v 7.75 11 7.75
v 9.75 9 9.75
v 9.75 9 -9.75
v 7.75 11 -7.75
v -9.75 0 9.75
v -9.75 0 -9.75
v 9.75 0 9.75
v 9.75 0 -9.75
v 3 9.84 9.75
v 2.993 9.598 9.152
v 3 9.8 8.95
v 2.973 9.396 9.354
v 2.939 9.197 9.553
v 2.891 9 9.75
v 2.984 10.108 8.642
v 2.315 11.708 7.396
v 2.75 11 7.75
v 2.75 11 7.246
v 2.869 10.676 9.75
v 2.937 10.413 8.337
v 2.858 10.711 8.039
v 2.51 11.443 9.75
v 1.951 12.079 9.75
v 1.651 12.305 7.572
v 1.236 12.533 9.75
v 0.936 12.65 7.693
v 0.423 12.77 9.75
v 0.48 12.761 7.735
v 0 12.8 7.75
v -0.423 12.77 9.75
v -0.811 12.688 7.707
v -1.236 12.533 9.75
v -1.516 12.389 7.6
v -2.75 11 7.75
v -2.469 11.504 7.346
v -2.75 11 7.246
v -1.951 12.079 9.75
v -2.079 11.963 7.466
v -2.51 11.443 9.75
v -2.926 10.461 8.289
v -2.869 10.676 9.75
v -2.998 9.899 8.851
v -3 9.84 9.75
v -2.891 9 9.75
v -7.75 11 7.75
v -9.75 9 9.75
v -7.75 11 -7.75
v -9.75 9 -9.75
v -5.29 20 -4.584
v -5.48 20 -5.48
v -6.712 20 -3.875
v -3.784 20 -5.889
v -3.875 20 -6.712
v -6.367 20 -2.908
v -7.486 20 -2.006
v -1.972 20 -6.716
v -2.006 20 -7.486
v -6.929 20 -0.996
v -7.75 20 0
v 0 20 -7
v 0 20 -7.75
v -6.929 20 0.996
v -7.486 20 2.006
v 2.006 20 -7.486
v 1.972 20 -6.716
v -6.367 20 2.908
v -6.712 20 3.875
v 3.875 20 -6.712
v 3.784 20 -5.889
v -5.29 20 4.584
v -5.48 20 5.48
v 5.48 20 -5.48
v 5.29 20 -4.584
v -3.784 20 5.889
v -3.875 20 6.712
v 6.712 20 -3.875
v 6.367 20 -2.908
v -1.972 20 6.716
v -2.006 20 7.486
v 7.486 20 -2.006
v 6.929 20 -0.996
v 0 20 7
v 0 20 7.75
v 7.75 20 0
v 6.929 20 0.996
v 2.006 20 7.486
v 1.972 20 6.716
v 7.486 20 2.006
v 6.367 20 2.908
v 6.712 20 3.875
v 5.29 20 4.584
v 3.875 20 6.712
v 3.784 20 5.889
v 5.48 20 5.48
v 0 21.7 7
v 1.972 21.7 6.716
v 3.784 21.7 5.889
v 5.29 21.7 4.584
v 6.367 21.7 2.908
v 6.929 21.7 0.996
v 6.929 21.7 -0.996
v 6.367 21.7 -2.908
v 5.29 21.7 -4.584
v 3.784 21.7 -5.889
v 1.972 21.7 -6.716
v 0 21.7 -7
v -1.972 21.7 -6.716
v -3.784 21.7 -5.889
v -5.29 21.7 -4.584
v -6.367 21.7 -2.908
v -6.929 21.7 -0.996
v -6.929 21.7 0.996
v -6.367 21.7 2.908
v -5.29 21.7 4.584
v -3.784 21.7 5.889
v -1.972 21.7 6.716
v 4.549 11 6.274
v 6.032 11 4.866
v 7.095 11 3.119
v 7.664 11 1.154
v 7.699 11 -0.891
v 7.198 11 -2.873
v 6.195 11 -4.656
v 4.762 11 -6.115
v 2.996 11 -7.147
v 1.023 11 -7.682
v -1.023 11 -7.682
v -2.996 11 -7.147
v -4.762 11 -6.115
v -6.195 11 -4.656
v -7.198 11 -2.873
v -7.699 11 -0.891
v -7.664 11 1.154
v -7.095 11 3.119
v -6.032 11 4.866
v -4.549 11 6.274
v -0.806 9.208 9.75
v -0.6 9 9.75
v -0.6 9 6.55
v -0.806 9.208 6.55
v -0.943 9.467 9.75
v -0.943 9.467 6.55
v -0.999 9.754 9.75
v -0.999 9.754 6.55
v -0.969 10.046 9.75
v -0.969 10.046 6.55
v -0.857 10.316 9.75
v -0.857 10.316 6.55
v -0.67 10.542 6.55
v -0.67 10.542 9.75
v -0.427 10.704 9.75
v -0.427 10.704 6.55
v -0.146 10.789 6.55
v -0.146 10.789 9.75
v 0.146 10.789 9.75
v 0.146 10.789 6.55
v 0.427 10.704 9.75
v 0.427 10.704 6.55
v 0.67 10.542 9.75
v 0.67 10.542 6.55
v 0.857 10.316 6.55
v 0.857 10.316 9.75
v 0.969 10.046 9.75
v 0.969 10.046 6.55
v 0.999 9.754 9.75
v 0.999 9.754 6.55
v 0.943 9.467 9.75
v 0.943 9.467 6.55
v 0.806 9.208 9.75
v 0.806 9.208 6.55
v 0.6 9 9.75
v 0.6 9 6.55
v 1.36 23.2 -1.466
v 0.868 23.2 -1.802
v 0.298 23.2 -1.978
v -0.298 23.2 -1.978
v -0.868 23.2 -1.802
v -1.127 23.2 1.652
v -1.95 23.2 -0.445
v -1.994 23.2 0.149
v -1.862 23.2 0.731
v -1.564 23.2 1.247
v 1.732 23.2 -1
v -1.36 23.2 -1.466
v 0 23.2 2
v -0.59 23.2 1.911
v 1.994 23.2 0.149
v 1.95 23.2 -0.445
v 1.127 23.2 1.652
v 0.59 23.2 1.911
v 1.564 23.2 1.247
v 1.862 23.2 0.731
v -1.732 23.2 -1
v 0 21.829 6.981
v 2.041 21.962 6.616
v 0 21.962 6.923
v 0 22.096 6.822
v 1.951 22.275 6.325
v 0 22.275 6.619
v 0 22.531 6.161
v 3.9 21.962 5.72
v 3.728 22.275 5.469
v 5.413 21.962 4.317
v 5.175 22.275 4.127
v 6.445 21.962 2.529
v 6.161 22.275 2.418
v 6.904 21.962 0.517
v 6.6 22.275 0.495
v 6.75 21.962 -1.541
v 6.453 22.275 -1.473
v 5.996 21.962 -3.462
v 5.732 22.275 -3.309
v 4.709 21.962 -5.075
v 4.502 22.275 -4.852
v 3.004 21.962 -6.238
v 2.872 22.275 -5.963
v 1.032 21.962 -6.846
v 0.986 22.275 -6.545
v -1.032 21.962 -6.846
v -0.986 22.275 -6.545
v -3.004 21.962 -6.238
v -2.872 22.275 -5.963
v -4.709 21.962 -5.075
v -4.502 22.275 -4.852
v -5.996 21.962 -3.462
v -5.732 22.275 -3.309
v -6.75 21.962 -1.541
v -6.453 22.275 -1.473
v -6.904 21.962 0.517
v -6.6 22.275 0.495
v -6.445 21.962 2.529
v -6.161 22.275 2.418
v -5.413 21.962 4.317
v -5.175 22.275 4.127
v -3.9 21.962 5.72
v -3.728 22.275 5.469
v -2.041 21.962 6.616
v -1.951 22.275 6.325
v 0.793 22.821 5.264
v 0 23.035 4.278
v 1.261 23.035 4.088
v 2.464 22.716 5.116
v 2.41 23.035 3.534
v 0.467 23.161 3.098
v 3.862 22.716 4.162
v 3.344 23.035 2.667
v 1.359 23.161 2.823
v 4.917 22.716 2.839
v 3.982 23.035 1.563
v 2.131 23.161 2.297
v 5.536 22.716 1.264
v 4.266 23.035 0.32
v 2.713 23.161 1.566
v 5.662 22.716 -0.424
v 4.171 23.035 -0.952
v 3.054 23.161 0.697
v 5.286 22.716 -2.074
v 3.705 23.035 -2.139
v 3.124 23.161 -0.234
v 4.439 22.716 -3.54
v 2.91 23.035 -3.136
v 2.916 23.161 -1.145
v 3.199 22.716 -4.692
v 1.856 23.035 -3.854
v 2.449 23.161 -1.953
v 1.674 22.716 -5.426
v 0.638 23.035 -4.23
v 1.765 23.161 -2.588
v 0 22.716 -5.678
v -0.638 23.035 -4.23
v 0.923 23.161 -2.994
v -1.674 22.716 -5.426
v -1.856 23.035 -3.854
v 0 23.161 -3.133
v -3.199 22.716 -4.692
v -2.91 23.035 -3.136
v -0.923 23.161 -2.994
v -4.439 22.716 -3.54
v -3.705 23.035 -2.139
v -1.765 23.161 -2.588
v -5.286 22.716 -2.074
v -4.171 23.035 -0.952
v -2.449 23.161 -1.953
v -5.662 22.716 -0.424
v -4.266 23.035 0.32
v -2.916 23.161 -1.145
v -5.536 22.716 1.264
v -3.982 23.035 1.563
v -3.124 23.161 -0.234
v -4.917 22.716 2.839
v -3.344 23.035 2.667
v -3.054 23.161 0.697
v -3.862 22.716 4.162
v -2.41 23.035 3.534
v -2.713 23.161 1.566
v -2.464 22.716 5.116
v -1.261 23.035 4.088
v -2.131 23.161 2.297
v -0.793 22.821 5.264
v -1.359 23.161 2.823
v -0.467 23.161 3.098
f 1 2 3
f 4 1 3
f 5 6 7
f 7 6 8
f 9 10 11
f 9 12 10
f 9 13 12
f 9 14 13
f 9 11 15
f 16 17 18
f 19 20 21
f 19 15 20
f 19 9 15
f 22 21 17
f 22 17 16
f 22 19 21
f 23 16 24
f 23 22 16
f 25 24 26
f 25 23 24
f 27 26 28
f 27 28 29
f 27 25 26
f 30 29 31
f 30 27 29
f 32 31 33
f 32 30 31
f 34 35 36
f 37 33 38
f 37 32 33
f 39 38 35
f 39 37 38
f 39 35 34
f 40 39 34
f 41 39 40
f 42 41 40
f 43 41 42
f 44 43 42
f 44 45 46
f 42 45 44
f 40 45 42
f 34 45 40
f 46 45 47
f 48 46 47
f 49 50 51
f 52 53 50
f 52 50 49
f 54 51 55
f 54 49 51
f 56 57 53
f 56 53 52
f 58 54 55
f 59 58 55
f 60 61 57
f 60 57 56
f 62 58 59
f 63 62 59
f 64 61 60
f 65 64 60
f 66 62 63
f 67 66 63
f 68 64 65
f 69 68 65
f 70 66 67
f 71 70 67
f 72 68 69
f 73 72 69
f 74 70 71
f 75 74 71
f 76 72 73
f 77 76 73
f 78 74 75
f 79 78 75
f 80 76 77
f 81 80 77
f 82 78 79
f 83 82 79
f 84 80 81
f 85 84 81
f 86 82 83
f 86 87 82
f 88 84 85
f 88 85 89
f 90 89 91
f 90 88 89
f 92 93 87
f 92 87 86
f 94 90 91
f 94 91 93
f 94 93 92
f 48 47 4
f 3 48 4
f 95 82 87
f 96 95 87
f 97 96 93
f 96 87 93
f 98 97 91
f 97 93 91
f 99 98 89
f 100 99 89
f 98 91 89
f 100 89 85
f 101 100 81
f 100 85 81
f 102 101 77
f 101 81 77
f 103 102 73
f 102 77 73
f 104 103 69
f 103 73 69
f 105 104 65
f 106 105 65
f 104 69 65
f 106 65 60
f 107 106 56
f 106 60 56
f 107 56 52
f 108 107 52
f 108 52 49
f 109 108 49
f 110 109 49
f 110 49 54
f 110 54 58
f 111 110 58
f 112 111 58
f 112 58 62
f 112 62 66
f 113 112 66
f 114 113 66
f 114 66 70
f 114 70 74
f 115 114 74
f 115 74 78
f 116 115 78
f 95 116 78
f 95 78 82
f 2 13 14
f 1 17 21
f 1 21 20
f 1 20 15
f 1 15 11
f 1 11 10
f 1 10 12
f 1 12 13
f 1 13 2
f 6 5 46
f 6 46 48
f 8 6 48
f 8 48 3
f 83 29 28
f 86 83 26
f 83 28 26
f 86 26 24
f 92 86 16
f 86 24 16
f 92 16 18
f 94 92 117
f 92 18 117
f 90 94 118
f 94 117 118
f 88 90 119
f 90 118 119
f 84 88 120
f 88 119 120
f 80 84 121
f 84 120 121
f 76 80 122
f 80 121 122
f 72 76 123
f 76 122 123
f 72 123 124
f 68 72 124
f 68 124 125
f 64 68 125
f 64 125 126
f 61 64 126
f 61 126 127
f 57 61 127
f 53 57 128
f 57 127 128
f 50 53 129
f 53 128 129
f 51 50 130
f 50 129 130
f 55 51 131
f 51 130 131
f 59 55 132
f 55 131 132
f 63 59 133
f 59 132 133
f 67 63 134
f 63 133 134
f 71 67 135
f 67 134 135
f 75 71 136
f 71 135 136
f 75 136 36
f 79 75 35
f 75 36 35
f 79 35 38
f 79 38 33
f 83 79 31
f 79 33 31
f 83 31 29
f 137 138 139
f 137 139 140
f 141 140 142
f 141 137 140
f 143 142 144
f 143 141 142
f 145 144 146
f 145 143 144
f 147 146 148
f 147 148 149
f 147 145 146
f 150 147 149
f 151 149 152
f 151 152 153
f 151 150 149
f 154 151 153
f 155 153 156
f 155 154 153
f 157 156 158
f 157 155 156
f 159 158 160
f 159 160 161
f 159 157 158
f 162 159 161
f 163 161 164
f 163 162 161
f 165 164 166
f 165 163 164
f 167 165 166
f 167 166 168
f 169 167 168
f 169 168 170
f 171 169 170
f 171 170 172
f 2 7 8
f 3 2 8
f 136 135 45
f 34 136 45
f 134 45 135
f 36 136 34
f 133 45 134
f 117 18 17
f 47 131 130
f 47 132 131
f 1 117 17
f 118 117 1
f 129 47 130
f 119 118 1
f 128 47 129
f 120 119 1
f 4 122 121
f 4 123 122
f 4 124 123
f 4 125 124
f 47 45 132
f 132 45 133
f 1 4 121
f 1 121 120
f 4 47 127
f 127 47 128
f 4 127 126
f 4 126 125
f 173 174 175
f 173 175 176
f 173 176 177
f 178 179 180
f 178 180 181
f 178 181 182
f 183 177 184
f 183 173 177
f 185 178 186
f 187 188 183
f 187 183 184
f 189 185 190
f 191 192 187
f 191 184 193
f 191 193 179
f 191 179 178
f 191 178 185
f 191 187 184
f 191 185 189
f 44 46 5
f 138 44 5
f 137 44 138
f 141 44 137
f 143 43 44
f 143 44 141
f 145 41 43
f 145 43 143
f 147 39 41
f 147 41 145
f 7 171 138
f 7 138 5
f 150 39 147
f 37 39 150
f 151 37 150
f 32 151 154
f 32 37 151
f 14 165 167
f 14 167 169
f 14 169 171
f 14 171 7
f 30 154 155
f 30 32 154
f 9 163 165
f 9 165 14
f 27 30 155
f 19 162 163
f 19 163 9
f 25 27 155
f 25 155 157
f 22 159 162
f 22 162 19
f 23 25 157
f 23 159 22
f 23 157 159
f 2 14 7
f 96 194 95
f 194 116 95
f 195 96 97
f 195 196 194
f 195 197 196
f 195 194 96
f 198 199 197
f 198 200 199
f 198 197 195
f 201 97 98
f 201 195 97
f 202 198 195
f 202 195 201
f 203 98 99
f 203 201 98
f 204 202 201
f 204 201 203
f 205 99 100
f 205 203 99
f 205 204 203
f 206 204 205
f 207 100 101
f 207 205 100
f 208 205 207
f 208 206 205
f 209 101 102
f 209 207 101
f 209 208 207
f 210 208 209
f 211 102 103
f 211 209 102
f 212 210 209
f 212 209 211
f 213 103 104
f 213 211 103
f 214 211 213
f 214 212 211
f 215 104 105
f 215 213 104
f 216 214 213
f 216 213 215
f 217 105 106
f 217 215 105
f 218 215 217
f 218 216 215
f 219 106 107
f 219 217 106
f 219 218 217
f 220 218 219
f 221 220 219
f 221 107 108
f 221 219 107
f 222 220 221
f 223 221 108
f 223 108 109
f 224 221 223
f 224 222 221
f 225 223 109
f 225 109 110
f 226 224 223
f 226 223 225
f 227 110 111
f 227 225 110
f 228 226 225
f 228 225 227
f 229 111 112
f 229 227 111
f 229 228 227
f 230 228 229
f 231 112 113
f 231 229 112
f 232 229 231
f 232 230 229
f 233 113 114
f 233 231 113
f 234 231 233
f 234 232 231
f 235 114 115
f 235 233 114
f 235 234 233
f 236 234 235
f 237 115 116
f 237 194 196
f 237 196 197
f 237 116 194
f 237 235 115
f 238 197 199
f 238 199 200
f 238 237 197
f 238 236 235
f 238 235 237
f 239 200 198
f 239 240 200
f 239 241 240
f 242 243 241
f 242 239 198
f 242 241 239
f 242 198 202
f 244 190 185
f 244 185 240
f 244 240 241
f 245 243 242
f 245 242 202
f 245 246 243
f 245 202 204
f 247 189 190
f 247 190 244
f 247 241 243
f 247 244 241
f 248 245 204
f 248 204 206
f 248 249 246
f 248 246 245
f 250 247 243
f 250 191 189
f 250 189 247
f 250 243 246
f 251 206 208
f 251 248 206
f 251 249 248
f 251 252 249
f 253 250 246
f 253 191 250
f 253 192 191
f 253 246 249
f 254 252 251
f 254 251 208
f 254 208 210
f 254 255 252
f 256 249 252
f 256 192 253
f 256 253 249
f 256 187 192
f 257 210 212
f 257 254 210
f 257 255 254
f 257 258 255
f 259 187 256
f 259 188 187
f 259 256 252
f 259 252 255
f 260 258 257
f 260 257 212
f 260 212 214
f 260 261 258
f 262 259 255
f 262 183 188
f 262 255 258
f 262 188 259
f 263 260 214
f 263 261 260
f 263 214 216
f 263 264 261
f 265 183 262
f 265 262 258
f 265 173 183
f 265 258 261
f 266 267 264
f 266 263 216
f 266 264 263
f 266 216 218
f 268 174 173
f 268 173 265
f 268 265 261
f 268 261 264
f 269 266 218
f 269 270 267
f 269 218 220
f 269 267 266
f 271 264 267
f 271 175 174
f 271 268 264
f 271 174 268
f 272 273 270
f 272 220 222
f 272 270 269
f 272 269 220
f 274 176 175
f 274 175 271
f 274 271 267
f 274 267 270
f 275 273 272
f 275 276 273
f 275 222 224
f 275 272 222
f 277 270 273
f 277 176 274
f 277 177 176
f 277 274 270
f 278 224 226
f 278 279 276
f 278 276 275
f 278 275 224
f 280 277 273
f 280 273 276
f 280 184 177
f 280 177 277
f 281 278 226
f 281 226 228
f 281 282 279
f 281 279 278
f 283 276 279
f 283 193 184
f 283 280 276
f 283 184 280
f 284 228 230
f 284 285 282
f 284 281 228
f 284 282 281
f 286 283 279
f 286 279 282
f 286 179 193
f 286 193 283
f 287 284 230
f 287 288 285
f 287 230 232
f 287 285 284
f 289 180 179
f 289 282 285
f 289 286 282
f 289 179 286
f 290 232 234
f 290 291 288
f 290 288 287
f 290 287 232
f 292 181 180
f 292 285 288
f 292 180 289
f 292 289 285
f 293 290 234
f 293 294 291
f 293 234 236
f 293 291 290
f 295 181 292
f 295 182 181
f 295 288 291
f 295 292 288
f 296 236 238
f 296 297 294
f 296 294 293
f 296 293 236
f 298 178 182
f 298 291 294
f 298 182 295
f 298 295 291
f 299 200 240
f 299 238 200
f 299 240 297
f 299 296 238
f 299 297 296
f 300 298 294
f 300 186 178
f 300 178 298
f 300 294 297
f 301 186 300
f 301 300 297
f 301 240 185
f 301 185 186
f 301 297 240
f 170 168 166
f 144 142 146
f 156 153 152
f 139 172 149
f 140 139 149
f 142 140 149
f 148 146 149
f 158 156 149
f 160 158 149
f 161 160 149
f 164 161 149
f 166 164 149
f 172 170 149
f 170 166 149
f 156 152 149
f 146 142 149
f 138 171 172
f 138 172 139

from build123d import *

# Parameters (mm, degrees)
SKETCH1_W           = 19.5
SKETCH1_H           = 19.5
BOSS_EXTRUDE1_DEPTH = 11
SKETCH2_R           = 7.75
BOSS_EXTRUDE2_DEPTH = 9
SKETCH3_R           = 7
BOSS_EXTRUDE3_DEPTH = 3.2
FILLET1_SIZE        = 1.5
FILLET1_SIZE_2      = 5
CHAMFER1_SIZE       = 2
BOSS_EXTRUDE8_REACH = 33.836
SKETCH4_R           = 3
SKETCH4_R_2         = 1
CUT_EXTRUDE1_DEPTH  = 3.2


# Some blends are built 0.0001 mm under size
with BuildPart() as part:
    # Sketch1 → Boss-Extrude1 (new body)
    with BuildSketch(Plane(origin=(0, 0, 0), x_dir=(1, 0, 0), z_dir=(0, 1, 0))):
        Rectangle(SKETCH1_W, SKETCH1_H)
    extrude(amount=BOSS_EXTRUDE1_DEPTH)

    # Sketch2 → Boss-Extrude2 (add)
    with BuildSketch(Plane(origin=(0, 11, 0), x_dir=(1, 0, 0), z_dir=(0, 1, 0))):
        with Locations(Location((0, 0, 0), (0, 0, 270))):
            Circle(SKETCH2_R)
    extrude(amount=BOSS_EXTRUDE2_DEPTH)

    # Sketch3 → Boss-Extrude3 (add)
    with BuildSketch(Plane(origin=(0, 20, 0), x_dir=(1, 0, 0), z_dir=(0, 1, 0))):
        with Locations(Location((0, 0, 0), (0, 0, 270))):
            Circle(SKETCH3_R)
    extrude(amount=BOSS_EXTRUDE3_DEPTH)

    # Fillet1
    # an asymmetric fillet: 5, 1.5 mm, written as the material it takes off along each edge
    with BuildSketch(Plane(origin=(0, 23.2, 0), x_dir=(0, 0, 1), z_dir=(-1, 0, 0))) as fillet1_piece_1:
        with BuildLine():
            Bezier((7, -FILLET1_SIZE), (7, 0), (7 - FILLET1_SIZE_2, 0), weights=[1, 0.707106781, 1])
            Line((7 - FILLET1_SIZE_2, 0), (7, 0))
            Line((7, 0), (7, -FILLET1_SIZE))
        make_face()
    revolve(axis=Axis((0, 23.2, 0), (0, 1, 0)), mode=Mode.SUBTRACT)

    # Chamfer1
    chamfer1_edges = [part.edges().sort_by_distance(p)[0] for p in [
        (-9.75, 11, 0),
        (0, 11, 9.75),
        (9.75, 11, 0),
        (0, 11, -9.75),
    ]]
    chamfer(chamfer1_edges, length=CHAMFER1_SIZE - 0.0001)  # a hair under: the kernel refuses the full size

    # Sketch4 → Boss-Extrude8 (add, up to next)
    with BuildSketch(Plane.XY.offset(9.75), mode=Mode.PRIVATE) as boss_extrude8_sk1:
        with Locations((0, 9.8)):
            Circle(SKETCH4_R)
        with Locations((0, 9.8)):
            Circle(SKETCH4_R_2, mode=Mode.SUBTRACT)
    boss_extrude8_tool1 = extrude(boss_extrude8_sk1.sketch, amount=-BOSS_EXTRUDE8_REACH, mode=Mode.PRIVATE) - part.part
    add(boss_extrude8_tool1.solids().sort_by_distance((-2.915147, 9.8, 9.75))[0])

    # Sketch5 → Cut-Extrude1 (cut)
    with BuildSketch(Plane.XY.offset(9.75)):
        with BuildLine():
            Line((0.6, 9), (-0.6, 9))
            ThreePointArc((-0.6, 9), (0, 10.8), (0.6, 9))
        make_face()
    extrude(amount=-CUT_EXTRUDE1_DEPTH, mode=Mode.SUBTRACT)


solid = part.part
